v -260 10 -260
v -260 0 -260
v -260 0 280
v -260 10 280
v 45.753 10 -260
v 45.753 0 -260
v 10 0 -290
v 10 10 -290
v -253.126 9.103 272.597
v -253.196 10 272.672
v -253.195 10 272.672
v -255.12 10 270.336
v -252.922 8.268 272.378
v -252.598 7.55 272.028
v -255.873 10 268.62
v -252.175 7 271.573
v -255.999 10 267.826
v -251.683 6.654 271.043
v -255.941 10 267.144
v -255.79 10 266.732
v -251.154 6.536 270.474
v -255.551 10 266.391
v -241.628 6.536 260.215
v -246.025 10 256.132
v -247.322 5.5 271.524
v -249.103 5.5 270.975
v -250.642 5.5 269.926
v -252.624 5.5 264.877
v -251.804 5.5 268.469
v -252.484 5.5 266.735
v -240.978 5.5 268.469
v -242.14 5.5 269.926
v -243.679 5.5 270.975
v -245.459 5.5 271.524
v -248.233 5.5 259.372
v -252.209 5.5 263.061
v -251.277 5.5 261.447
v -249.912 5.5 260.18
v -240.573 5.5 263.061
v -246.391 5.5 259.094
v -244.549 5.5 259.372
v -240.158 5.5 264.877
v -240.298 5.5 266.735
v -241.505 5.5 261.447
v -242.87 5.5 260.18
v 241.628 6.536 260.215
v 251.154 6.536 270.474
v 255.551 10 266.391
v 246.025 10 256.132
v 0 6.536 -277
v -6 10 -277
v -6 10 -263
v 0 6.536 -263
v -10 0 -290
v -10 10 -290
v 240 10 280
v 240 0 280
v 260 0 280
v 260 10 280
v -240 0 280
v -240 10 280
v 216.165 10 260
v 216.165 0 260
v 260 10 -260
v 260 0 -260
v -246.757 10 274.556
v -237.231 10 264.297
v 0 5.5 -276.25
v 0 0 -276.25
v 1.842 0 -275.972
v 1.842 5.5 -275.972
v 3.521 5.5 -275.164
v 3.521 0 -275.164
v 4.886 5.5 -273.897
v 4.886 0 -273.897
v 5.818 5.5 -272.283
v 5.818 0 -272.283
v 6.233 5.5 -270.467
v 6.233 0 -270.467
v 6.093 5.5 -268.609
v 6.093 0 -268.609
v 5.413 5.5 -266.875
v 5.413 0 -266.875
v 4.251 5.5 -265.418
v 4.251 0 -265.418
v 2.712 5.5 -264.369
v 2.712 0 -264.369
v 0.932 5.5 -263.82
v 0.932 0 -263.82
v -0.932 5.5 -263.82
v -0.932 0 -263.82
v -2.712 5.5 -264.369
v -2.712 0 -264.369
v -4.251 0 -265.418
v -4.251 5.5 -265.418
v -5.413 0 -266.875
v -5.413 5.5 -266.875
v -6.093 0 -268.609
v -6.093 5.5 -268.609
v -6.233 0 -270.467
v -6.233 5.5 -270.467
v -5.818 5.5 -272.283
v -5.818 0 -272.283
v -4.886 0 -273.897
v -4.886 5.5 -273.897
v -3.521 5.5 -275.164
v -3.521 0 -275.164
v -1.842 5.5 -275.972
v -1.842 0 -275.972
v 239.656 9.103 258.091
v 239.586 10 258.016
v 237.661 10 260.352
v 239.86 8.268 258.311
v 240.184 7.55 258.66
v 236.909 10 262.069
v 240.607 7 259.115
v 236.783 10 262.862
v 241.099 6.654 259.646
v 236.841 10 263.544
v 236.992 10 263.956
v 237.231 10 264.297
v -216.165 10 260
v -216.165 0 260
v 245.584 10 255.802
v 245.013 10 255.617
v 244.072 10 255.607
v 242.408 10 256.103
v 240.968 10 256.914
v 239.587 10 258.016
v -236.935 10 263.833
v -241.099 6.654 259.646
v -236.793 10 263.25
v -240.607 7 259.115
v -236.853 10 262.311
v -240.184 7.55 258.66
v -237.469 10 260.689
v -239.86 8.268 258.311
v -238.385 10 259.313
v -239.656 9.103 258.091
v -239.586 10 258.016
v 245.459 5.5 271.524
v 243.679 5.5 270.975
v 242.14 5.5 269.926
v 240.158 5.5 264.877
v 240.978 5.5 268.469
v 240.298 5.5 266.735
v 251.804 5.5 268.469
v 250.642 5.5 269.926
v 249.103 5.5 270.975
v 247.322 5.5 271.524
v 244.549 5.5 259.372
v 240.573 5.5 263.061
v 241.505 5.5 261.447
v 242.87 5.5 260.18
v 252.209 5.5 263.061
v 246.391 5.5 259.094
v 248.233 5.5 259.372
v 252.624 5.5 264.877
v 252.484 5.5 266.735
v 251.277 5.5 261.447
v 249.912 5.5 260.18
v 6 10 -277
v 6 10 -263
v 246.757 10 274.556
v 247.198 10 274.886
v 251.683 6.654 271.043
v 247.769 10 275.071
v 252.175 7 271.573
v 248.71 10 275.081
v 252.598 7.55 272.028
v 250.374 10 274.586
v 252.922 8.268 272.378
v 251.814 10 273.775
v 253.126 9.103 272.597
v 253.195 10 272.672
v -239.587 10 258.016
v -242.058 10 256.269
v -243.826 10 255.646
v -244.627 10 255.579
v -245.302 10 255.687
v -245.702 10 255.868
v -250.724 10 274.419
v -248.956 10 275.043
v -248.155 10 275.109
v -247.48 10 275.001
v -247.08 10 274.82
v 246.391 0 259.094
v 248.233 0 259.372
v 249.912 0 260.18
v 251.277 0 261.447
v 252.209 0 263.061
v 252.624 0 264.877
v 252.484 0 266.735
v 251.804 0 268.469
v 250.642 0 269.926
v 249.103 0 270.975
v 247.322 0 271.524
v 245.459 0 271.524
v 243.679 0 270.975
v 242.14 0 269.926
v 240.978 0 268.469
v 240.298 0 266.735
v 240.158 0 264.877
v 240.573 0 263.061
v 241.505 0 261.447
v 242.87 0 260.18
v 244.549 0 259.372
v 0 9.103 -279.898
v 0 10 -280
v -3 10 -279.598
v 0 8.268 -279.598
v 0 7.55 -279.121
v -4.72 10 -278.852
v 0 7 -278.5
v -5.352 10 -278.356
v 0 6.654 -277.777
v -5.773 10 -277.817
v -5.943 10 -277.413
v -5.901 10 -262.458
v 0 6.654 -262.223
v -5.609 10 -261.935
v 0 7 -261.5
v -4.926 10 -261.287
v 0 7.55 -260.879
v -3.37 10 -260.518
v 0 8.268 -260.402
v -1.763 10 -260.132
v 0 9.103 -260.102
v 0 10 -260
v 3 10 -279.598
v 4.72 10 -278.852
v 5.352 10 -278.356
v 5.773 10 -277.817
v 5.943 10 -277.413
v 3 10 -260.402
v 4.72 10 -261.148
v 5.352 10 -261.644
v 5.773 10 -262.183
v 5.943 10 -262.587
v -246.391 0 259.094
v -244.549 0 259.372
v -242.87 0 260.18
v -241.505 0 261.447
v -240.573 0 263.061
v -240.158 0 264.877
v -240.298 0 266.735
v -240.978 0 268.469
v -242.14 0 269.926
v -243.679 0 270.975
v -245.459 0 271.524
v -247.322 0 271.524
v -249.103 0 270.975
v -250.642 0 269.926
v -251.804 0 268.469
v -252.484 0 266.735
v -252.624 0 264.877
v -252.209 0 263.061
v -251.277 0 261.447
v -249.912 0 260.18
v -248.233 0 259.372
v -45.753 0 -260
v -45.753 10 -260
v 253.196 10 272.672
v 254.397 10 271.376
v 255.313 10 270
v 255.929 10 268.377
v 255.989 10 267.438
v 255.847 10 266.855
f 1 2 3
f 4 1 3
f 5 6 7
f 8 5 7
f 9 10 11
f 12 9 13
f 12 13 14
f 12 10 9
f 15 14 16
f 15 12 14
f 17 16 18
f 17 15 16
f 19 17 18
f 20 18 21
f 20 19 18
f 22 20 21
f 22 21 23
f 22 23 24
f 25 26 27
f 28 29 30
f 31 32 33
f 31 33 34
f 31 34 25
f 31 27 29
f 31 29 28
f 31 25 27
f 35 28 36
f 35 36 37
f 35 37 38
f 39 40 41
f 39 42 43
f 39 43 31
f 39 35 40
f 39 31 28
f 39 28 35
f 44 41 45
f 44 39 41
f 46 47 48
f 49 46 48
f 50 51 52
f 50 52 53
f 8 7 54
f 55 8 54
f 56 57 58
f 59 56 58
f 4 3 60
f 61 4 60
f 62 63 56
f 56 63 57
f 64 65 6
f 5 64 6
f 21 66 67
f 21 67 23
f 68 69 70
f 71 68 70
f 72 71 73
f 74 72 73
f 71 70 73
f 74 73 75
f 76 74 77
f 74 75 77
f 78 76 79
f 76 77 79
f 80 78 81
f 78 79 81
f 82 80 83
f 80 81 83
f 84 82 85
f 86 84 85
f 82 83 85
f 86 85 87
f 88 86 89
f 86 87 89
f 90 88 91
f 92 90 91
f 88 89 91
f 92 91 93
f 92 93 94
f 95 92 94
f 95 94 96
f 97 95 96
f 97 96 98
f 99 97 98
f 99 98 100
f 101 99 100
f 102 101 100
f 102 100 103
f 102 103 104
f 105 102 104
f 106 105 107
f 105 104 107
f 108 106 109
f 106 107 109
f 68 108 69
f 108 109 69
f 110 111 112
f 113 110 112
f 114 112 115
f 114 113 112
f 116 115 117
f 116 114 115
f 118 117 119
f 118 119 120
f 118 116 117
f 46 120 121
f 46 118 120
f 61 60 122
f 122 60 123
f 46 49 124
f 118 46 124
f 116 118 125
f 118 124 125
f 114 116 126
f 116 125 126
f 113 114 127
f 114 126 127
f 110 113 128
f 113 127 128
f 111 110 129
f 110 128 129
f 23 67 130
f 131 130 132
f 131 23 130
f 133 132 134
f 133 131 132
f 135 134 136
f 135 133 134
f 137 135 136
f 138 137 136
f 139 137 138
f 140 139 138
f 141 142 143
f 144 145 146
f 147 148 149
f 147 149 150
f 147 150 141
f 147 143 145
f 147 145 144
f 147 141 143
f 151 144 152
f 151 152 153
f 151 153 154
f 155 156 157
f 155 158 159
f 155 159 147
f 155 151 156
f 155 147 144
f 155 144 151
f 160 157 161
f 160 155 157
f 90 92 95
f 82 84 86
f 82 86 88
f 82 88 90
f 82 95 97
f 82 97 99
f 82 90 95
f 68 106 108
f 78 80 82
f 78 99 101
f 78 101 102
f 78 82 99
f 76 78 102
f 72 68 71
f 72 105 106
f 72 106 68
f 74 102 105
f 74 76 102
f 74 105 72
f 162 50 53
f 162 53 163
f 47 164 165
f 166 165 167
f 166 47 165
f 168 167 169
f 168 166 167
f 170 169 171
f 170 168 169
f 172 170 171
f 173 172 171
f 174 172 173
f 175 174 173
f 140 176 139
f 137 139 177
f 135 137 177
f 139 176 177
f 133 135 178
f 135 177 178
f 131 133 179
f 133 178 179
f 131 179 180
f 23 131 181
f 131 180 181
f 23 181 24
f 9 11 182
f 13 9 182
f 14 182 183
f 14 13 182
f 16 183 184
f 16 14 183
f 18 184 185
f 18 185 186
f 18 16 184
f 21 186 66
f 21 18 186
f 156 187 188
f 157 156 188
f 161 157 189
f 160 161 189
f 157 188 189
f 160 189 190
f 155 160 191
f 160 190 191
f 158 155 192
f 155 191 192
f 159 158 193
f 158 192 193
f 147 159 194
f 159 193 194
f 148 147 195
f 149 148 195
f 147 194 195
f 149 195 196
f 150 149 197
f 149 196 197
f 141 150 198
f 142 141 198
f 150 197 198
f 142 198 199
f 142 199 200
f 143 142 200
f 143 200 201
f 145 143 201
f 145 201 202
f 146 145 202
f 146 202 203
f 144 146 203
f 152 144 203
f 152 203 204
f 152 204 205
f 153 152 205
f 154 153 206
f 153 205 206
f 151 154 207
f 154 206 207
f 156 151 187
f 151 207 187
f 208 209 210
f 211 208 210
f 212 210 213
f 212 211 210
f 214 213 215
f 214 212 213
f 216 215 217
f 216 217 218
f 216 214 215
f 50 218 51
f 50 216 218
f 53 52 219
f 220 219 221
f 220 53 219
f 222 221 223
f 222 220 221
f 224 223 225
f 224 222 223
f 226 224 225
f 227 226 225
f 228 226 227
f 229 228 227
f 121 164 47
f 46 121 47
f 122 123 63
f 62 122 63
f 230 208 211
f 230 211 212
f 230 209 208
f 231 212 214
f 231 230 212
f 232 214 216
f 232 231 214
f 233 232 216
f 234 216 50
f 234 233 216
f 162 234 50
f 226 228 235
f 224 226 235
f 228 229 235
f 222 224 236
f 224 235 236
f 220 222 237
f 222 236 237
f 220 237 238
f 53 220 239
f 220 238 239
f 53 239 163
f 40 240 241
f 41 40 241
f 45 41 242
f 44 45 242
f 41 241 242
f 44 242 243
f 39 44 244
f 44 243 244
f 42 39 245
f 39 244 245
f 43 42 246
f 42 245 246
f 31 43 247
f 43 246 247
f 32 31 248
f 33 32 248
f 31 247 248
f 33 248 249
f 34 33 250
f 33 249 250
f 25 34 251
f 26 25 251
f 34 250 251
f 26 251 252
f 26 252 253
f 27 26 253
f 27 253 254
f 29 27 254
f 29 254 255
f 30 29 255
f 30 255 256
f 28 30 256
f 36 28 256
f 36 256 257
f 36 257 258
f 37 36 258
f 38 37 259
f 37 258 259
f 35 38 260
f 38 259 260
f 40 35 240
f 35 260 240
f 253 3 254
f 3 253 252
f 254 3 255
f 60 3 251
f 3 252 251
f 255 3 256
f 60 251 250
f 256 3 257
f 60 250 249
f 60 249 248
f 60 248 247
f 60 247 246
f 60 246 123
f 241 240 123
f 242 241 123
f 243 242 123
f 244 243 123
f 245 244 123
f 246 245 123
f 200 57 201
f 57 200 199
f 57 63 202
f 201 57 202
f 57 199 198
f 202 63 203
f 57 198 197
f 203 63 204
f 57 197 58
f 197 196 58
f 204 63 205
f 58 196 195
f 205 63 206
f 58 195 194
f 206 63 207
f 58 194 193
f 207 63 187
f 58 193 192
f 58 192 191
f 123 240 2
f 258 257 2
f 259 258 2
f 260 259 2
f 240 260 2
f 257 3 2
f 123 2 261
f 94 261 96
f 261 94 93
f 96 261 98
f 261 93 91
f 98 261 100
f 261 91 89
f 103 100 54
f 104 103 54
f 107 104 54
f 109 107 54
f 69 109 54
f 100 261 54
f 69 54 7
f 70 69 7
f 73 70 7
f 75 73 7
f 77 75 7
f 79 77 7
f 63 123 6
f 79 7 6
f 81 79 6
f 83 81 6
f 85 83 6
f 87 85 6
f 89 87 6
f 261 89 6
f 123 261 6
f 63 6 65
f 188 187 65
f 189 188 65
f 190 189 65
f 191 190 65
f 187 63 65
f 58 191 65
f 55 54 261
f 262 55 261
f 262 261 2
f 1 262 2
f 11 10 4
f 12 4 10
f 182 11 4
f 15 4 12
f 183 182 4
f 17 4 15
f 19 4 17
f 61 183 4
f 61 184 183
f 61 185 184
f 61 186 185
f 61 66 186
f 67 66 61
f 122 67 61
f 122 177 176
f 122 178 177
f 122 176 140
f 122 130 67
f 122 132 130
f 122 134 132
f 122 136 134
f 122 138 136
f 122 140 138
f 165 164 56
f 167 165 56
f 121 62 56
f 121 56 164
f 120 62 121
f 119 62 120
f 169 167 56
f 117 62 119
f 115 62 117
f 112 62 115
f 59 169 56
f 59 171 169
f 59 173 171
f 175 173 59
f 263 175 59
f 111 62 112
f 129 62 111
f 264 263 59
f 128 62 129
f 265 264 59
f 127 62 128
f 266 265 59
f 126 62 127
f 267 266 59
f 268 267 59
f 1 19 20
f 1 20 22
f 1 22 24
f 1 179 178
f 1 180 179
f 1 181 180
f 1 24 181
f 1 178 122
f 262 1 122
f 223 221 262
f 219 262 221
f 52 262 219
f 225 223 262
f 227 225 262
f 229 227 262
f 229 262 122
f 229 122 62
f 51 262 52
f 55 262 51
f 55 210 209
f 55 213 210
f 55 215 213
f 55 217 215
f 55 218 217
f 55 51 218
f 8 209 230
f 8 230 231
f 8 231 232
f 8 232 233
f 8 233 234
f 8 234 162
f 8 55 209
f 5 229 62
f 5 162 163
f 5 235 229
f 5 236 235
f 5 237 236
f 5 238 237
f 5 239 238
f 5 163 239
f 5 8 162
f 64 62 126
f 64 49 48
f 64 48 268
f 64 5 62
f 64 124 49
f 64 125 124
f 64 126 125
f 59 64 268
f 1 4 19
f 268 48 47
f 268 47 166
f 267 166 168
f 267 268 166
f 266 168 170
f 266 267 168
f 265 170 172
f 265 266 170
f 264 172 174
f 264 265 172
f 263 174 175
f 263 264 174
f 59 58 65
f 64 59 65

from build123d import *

# Parameters (mm, degrees)
BOSS_EXTRUDE1_DEPTH  = 10
CUT_EXTRUDE1_DEPTH   = 20
FILLET1_R            = 3
FILLET1_OF_MIRROR1_R = 3
CUT_EXTRUDE2_DEPTH   = 20
FILLET2_R            = 3
SKETCH7_R            = 6.25
CUT_EXTRUDE3_DEPTH   = 5.5


with BuildPart() as part:
    # Sketch1 → Boss-Extrude1 (new body)
    with BuildSketch(Plane(origin=(0, 0, 0), x_dir=(1, 0, 0), z_dir=(0, 1, 0))):
        Polygon((-260, -260), (-260, -280), (-240, -280), (-216.164928148, -260), (216.164928148, -260), (240, -280), (260, -280), (260, -260), (260, 260), (45.752607778, 260), (10, 290), (-10, 290), (-45.752607778, 260), (-260, 260), align=None)
    extrude(amount=BOSS_EXTRUDE1_DEPTH)

    # Sketch5 → Cut-Extrude1 (cut)
    with BuildSketch(Plane(origin=(-253.195489006, 0, 272.672065084), x_dir=(0, -1, 0), z_dir=(0.6804510993672804, 0, -0.7327934916262968))):
        Polygon((-10, 6), (-10, -6), (-6.535898385, 0), align=None)
    cut_extrude1 = extrude(amount=CUT_EXTRUDE1_DEPTH, mode=Mode.SUBTRACT)

    # Fillet1
    fillet1_edges = [part.edges().sort_by_distance(p)[0] for p in [
        (-241.784847494, 8.267949192, 255.974841953),
        (-237.388086544, 8.267949192, 260.057548549),
        (-250.997108531, 8.267949192, 274.713418382),
        (-255.393869481, 8.267949192, 270.630711786),
    ]]
    fillet(fillet1_edges, radius=FILLET1_R - 0.0001)  # a hair under: the kernel refuses the full size

    # Mirror1: Cut-Extrude1 across plane
    add(cut_extrude1.mirror(Plane(origin=(0, 0, 0), x_dir=(0, 0, 1), z_dir=(1, 0, 0))), mode=Mode.SUBTRACT)

    # Fillet1 of Mirror1
    fillet1_of_mirror1_edges = [part.edges().sort_by_distance(p)[0] for p in [
        (241.784847494, 8.267949192, 255.974841953),
        (237.388086544, 8.267949192, 260.057548549),
        (250.997108531, 8.267949192, 274.713418382),
        (255.393869481, 8.267949192, 270.630711786),
    ]]
    fillet(fillet1_of_mirror1_edges, radius=FILLET1_OF_MIRROR1_R - 0.0001)  # a hair under: the kernel refuses the full size

    # Sketch6 → Cut-Extrude2 (cut)
    with BuildSketch(Plane(origin=(0, 0, -280), x_dir=(-1, 0, 0), z_dir=(0, 0, -1))):
        Polygon((-6, 10), (6, 10), (0, 6.535898385), align=None)
    extrude(amount=-CUT_EXTRUDE2_DEPTH, mode=Mode.SUBTRACT)

    # Fillet2
    fillet2_edges = [part.edges().sort_by_distance(p)[0] for p in [
        (3, 8.267949192, -260),
        (-3, 8.267949192, -260),
        (3, 8.267949192, -280),
        (-3, 8.267949192, -280),
    ]]
    fillet(fillet2_edges, radius=FILLET2_R - 0.0001)  # a hair under: the kernel refuses the full size

    # Sketch7 → Cut-Extrude3 (cut)
    with BuildSketch(Plane.XZ):
        with Locations(Location((-246.390978013, 265.344130167, 0), (0, 0, 270))):
            Circle(SKETCH7_R)
        with Locations(Location((246.390978013, 265.344130167, 0), (0, 0, 270))):
            Circle(SKETCH7_R)
        with Locations(Location((0, -270, 0), (0, 0, 270))):
            Circle(SKETCH7_R)
    extrude(amount=-CUT_EXTRUDE3_DEPTH, mode=Mode.SUBTRACT)


solid = part.part
